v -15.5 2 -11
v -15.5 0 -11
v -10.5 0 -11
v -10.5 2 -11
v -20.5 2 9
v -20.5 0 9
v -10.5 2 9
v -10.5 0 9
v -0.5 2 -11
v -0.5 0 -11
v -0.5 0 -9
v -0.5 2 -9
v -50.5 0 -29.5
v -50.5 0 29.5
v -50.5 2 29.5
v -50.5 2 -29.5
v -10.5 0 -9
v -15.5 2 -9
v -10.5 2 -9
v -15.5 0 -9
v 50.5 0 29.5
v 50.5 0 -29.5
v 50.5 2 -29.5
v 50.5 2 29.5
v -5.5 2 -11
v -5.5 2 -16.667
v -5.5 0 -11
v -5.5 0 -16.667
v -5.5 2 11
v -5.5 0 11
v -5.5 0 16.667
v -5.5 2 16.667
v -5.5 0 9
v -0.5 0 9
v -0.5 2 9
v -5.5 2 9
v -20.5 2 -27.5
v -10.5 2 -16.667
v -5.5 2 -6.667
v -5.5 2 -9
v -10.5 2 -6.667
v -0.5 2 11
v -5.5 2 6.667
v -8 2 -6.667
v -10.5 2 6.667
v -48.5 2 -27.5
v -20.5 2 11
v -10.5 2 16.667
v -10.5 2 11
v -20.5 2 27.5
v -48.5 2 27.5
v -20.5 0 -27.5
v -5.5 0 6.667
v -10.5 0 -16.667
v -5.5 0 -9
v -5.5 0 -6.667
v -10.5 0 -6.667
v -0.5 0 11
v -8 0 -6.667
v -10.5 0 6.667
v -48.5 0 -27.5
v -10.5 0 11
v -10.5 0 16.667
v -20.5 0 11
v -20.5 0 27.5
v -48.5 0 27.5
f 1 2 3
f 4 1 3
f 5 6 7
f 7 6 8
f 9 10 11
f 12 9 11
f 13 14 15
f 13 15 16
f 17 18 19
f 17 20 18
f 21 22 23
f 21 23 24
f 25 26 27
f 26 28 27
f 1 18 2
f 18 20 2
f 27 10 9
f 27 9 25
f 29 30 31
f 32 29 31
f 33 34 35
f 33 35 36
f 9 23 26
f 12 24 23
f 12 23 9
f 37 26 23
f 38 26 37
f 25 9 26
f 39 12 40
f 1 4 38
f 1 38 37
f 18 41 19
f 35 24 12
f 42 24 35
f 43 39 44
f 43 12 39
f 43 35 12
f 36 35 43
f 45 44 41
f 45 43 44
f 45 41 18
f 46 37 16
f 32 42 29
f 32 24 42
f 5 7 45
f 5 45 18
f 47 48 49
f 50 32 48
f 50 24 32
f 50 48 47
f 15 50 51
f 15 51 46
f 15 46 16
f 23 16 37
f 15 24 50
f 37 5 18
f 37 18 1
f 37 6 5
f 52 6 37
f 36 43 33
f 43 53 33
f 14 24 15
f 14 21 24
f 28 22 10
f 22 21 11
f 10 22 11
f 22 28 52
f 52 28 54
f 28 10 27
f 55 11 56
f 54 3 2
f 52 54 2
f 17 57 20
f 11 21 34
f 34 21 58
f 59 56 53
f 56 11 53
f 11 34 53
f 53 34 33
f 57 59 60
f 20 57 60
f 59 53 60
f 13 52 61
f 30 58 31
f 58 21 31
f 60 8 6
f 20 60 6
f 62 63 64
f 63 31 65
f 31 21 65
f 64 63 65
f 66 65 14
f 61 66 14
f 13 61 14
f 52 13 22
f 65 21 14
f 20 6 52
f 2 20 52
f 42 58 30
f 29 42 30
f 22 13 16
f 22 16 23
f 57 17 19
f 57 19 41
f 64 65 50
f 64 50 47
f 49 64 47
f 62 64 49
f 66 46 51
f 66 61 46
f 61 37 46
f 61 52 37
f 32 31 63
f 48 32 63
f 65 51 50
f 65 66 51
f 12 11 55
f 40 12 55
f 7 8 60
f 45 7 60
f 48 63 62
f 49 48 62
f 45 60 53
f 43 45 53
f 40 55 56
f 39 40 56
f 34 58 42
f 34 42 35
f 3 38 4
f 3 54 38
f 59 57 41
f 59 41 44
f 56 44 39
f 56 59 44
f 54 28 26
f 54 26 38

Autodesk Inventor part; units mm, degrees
ref_plane "YZ Plane" through (0, 0, 0) normal (1, 0, 0) x (0, 1, 0)
ref_plane "XZ Plane" through (0, 0, 0) normal (0, 1, 0) x (-1, 0, 0)
ref_plane "XY Plane" through (0, 0, 0) normal (0, 0, 1) x (1, 0, 0)
sketch "Sketch1" plane through (0, 0, 0) normal (0, 1, 0) x (-1, 0, 0)
  line L0 (-50.5, 29.5) -> (50.5, 29.5)
  line L1 (50.5, 29.5) -> (50.5, -29.5)
  line L2 (50.5, -29.5) -> (-50.5, -29.5)
  line L3 (-50.5, -29.5) -> (-50.5, 29.5)
  line L4 (-50.5, 29.5) -> (50.5, -29.5) construction
  line L5 (50.5, 29.5) -> (-50.5, -29.5) construction
  line L6 (5.5, 16.6667) -> (10.5, 16.6667)
  line L7 (10.5, 6.6667) -> (5.5, 6.6667)
  line L8 (5.5, 6.6667) -> (5.5, 16.6667)
  line L9 (5.5, 16.6667) -> (10.5, 6.6667) construction
  line L10 (10.5, 16.6667) -> (5.5, 6.6667) construction
  line L11 (5.5, -16.6667) -> (10.5, -16.6667)
  line L12 (10.5, -6.6667) -> (5.5, -6.6667)
  line L13 (5.5, -16.6667) -> (10.5, -6.6667) construction
  line L14 (10.5, -16.6667) -> (5.5, -6.6667) construction
  line L15 (10.5, 10) -> (20.5, 10)
  line L16 (20.5, 11) -> (20.5, 9)
  line L17 (20.5, 9) -> (10.5, 9)
  line L18 (20.5, 11) -> (10.5, 11)
  line L19 (10.5, -10) -> (15.5, -10)
  line L20 (15.5, -9) -> (15.5, -11)
  line L21 (5.5, 10) -> (0.5, 10)
  line L22 (0.5, 11) -> (0.5, 9)
  line L23 (0.5, 11) -> (5.5, 11)
  line L24 (0.5, 9) -> (5.5, 9)
  line L25 (15.5, -11) -> (10.5, -11)
  line L26 (15.5, -9) -> (10.5, -9)
  line L27 (48.5, 27.5) -> (20.5, 27.5)
  line L28 (20.5, 27.5) -> (20.5, -27.5)
  line L29 (20.5, -27.5) -> (48.5, -27.5)
  line L30 (48.5, -27.5) -> (48.5, 27.5)
  line L31 (10.5, 16.6667) -> (10.5, 13.3333)
  line L32 (10.5, 13.3333) -> (10.5, 10)
  line L33 (10.5, 10) -> (10.5, 6.6667)
  line L34 (5.5, -16.6667) -> (5.5, -13.3333)
  line L35 (5.5, -13.3333) -> (5.5, -10)
  line L36 (5.5, -10) -> (5.5, -6.6667)
  line L37 (0.5, -11) -> (0.5, -9)
  line L38 (5.5, -10) -> (0.5, -10)
  line L39 (0.5, -11) -> (5.5, -11)
  line L40 (0.5, -9) -> (5.5, -9)
  line L41 (10.5, -16.6667) -> (10.5, -6.6667)
  line L42 (8, 11.6667) -> (8, -11.6667)
  line L43 (50.5, 0) -> (-50.5, 0)
  point P0 (0, 0)
  point P1 (0, 29.5)
  point P2 (0, -29.5)
  point P3 (8, 0)
  dimension "d0" = 101
  dimension "d1" = 59
  dimension "d4" = 5
  dimension "d5" = 10
  dimension "d6" = 10
  dimension "d7" = 2
  dimension "d8" = 5
  dimension "d14" = 20
  dimension "d15" = 2
  dimension "d16" = 2
  dimension "d17" = 55
  dimension "d18" = 2
  dimension "d19" = 28
  dimension "d27" = 42.5
extrude "Extrusion4" add sketch "Sketch1" along normal blind 2 contours L0 L1 L43 L30 L27 L28 L18 L32 L31 L6 L8 L23 L22 L24 L7 L42 L3 | L43 L28 L29 L30 L1 L2 L3 | L42 L7 L33 L17 L28 L43
properties part number "Lag2"
